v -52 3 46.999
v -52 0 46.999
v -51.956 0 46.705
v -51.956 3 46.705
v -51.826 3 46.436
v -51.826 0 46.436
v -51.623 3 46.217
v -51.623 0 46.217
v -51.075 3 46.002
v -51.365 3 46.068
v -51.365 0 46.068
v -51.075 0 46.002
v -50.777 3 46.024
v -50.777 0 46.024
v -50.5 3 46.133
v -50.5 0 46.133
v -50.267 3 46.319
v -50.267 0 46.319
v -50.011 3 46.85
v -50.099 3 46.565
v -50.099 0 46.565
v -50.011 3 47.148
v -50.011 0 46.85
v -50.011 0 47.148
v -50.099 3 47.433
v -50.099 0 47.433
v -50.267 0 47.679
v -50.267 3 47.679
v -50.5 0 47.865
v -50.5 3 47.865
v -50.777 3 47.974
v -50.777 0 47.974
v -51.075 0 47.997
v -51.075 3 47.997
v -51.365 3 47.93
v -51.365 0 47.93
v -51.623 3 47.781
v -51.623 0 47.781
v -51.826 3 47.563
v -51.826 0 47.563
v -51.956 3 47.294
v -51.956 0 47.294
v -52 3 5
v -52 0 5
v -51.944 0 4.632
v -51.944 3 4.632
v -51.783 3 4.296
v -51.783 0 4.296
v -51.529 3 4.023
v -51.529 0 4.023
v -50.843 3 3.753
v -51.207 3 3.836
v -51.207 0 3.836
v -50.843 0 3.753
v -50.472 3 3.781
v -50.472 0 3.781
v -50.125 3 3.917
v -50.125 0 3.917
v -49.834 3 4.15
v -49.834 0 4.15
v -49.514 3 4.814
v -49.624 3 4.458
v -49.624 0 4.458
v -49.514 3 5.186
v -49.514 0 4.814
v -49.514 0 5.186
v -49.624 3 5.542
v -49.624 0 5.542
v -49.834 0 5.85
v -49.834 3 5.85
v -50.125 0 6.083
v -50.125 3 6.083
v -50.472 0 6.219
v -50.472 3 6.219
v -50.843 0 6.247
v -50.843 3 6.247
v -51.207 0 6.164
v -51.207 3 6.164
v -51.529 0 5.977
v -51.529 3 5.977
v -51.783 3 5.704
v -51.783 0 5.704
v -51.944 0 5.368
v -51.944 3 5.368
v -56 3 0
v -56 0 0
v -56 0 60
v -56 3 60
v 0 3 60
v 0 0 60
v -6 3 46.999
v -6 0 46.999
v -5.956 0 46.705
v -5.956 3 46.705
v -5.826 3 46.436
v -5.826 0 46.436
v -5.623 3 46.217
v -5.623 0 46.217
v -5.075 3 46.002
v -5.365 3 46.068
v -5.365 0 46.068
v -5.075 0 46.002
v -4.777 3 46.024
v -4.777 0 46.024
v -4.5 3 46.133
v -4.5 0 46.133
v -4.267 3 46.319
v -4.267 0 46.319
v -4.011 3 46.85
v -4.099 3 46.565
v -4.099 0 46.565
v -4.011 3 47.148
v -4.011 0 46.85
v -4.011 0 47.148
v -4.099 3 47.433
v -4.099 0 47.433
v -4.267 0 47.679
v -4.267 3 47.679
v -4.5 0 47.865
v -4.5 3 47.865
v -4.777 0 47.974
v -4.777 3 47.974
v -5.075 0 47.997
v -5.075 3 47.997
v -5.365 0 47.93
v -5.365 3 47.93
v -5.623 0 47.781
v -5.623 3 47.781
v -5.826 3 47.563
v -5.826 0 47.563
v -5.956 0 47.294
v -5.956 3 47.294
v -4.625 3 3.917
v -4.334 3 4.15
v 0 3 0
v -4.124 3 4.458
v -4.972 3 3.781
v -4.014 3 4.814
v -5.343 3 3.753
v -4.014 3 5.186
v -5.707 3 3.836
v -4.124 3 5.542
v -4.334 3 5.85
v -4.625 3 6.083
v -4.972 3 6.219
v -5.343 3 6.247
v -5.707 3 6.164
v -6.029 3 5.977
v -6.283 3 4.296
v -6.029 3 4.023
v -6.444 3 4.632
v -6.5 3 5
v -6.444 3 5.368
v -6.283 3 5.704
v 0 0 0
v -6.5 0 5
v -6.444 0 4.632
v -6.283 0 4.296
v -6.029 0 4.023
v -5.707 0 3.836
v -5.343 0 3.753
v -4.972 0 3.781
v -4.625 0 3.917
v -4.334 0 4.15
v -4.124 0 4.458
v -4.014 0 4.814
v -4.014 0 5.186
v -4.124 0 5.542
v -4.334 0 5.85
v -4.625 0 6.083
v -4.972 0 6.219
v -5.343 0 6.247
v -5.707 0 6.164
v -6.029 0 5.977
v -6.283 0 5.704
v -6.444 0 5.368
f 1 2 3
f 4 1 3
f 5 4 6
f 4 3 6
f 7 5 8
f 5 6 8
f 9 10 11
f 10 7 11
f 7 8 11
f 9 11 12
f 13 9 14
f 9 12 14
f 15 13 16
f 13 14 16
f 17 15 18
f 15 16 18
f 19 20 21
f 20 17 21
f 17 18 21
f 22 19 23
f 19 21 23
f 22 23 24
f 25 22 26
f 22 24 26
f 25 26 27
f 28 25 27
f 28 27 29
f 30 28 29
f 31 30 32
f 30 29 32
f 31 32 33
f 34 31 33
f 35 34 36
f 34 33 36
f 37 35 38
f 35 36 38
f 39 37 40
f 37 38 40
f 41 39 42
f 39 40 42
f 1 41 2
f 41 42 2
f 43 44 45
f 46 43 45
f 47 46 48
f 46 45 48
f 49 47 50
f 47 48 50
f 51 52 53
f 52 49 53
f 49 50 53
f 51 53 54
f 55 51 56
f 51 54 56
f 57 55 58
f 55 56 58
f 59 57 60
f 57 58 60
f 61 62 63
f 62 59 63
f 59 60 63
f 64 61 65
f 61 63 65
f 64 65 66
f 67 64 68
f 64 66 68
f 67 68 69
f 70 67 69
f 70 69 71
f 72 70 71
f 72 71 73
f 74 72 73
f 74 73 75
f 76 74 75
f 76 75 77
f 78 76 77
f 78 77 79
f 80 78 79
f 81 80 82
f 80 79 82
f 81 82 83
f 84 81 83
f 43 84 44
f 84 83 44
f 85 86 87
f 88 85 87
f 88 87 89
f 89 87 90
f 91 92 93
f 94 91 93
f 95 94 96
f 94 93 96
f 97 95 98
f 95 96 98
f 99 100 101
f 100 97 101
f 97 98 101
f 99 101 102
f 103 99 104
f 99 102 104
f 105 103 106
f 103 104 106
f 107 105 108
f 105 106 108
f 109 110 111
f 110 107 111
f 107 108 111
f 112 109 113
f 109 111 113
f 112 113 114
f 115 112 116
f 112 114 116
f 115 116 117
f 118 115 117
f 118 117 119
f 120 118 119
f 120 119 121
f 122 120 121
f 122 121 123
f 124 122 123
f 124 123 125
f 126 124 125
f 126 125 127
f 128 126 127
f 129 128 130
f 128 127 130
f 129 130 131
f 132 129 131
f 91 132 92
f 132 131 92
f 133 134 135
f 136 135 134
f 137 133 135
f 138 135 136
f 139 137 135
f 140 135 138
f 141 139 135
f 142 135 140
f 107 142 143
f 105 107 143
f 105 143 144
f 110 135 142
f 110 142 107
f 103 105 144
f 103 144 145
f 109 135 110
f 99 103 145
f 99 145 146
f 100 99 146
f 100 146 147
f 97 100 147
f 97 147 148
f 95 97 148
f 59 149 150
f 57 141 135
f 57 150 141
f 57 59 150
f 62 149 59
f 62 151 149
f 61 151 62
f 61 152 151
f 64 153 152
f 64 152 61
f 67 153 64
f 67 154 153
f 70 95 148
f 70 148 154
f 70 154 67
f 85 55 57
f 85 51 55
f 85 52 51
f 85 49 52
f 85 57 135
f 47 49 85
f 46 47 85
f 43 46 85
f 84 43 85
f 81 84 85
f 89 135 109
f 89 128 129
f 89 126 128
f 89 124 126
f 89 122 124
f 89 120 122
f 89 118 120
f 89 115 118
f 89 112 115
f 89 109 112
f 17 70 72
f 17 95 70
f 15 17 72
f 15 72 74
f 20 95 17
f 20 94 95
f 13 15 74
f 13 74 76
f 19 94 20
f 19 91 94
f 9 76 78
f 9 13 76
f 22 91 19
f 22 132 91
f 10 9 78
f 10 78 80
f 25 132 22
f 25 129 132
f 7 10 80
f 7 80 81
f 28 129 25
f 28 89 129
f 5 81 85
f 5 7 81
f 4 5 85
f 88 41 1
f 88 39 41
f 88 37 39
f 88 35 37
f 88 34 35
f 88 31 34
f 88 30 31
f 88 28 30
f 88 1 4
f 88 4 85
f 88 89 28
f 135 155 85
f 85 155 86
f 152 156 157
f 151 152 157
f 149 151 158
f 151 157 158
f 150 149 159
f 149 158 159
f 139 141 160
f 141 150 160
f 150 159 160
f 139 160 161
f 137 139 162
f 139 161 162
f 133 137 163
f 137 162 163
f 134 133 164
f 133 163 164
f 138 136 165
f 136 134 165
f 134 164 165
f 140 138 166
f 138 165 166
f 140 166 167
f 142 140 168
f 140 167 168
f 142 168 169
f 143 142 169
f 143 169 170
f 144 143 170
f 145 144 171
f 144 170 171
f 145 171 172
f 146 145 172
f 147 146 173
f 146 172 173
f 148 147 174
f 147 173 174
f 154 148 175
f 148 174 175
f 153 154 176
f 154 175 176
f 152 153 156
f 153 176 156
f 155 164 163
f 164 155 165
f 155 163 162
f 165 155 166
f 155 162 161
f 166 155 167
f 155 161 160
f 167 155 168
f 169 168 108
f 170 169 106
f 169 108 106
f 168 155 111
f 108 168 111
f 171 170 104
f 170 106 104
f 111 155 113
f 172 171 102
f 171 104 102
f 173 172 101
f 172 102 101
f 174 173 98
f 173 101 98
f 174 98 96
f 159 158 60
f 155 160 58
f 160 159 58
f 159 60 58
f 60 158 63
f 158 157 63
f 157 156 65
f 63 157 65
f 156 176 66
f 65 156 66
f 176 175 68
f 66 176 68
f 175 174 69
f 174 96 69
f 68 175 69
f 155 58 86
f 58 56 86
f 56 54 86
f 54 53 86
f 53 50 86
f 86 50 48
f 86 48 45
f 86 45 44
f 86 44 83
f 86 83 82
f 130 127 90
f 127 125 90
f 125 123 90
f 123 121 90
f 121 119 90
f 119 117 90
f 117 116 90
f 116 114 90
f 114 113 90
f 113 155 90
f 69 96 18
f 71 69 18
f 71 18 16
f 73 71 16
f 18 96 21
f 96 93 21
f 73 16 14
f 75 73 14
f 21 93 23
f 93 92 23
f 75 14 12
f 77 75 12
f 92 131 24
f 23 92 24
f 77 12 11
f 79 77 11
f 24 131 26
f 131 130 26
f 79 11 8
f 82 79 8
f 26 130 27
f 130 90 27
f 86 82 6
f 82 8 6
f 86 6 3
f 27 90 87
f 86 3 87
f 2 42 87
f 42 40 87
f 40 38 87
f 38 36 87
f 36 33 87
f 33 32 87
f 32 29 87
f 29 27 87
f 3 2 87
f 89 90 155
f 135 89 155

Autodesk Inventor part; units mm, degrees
ref_plane "YZ Plane" through (0, 0, 0) normal (1, 0, 0) x (0, 1, 0)
ref_plane "XZ Plane" through (0, 0, 0) normal (0, 1, 0) x (-1, 0, 0)
ref_plane "XY Plane" through (0, 0, 0) normal (0, 0, 1) x (1, 0, 0)
sketch "Sketch1" plane through (0, 0, 0) normal (0, 1, 0) x (-1, 0, 0)
  line L0 (0, 0) -> (56, 0)
  line L1 (56, 0) -> (56, 60)
  line L2 (56, 60) -> (0, 60)
  line L3 (0, 60) -> (0, 0)
  circle A0 centre (5.25, 5) radius 1.25
  circle A1 centre (5, 46.9993) radius 1
  line L4 (28, 60) -> (28, 0) construction
  circle A2 centre (50.75, 5) radius 1.25
  circle A3 centre (51, 46.9993) radius 1
  dimension "d0" = 56
  dimension "d1" = 60
  dimension "d4" = 2.5
  dimension "d5" = 5.25
  dimension "d6" = 5
  dimension "d7" = 2
  dimension "d8" = 5
  dimension "d9" = 42
extrude "Extrusion1" add sketch "Sketch1" along normal blind 3
properties part number "wall-front-outer-scaled"
